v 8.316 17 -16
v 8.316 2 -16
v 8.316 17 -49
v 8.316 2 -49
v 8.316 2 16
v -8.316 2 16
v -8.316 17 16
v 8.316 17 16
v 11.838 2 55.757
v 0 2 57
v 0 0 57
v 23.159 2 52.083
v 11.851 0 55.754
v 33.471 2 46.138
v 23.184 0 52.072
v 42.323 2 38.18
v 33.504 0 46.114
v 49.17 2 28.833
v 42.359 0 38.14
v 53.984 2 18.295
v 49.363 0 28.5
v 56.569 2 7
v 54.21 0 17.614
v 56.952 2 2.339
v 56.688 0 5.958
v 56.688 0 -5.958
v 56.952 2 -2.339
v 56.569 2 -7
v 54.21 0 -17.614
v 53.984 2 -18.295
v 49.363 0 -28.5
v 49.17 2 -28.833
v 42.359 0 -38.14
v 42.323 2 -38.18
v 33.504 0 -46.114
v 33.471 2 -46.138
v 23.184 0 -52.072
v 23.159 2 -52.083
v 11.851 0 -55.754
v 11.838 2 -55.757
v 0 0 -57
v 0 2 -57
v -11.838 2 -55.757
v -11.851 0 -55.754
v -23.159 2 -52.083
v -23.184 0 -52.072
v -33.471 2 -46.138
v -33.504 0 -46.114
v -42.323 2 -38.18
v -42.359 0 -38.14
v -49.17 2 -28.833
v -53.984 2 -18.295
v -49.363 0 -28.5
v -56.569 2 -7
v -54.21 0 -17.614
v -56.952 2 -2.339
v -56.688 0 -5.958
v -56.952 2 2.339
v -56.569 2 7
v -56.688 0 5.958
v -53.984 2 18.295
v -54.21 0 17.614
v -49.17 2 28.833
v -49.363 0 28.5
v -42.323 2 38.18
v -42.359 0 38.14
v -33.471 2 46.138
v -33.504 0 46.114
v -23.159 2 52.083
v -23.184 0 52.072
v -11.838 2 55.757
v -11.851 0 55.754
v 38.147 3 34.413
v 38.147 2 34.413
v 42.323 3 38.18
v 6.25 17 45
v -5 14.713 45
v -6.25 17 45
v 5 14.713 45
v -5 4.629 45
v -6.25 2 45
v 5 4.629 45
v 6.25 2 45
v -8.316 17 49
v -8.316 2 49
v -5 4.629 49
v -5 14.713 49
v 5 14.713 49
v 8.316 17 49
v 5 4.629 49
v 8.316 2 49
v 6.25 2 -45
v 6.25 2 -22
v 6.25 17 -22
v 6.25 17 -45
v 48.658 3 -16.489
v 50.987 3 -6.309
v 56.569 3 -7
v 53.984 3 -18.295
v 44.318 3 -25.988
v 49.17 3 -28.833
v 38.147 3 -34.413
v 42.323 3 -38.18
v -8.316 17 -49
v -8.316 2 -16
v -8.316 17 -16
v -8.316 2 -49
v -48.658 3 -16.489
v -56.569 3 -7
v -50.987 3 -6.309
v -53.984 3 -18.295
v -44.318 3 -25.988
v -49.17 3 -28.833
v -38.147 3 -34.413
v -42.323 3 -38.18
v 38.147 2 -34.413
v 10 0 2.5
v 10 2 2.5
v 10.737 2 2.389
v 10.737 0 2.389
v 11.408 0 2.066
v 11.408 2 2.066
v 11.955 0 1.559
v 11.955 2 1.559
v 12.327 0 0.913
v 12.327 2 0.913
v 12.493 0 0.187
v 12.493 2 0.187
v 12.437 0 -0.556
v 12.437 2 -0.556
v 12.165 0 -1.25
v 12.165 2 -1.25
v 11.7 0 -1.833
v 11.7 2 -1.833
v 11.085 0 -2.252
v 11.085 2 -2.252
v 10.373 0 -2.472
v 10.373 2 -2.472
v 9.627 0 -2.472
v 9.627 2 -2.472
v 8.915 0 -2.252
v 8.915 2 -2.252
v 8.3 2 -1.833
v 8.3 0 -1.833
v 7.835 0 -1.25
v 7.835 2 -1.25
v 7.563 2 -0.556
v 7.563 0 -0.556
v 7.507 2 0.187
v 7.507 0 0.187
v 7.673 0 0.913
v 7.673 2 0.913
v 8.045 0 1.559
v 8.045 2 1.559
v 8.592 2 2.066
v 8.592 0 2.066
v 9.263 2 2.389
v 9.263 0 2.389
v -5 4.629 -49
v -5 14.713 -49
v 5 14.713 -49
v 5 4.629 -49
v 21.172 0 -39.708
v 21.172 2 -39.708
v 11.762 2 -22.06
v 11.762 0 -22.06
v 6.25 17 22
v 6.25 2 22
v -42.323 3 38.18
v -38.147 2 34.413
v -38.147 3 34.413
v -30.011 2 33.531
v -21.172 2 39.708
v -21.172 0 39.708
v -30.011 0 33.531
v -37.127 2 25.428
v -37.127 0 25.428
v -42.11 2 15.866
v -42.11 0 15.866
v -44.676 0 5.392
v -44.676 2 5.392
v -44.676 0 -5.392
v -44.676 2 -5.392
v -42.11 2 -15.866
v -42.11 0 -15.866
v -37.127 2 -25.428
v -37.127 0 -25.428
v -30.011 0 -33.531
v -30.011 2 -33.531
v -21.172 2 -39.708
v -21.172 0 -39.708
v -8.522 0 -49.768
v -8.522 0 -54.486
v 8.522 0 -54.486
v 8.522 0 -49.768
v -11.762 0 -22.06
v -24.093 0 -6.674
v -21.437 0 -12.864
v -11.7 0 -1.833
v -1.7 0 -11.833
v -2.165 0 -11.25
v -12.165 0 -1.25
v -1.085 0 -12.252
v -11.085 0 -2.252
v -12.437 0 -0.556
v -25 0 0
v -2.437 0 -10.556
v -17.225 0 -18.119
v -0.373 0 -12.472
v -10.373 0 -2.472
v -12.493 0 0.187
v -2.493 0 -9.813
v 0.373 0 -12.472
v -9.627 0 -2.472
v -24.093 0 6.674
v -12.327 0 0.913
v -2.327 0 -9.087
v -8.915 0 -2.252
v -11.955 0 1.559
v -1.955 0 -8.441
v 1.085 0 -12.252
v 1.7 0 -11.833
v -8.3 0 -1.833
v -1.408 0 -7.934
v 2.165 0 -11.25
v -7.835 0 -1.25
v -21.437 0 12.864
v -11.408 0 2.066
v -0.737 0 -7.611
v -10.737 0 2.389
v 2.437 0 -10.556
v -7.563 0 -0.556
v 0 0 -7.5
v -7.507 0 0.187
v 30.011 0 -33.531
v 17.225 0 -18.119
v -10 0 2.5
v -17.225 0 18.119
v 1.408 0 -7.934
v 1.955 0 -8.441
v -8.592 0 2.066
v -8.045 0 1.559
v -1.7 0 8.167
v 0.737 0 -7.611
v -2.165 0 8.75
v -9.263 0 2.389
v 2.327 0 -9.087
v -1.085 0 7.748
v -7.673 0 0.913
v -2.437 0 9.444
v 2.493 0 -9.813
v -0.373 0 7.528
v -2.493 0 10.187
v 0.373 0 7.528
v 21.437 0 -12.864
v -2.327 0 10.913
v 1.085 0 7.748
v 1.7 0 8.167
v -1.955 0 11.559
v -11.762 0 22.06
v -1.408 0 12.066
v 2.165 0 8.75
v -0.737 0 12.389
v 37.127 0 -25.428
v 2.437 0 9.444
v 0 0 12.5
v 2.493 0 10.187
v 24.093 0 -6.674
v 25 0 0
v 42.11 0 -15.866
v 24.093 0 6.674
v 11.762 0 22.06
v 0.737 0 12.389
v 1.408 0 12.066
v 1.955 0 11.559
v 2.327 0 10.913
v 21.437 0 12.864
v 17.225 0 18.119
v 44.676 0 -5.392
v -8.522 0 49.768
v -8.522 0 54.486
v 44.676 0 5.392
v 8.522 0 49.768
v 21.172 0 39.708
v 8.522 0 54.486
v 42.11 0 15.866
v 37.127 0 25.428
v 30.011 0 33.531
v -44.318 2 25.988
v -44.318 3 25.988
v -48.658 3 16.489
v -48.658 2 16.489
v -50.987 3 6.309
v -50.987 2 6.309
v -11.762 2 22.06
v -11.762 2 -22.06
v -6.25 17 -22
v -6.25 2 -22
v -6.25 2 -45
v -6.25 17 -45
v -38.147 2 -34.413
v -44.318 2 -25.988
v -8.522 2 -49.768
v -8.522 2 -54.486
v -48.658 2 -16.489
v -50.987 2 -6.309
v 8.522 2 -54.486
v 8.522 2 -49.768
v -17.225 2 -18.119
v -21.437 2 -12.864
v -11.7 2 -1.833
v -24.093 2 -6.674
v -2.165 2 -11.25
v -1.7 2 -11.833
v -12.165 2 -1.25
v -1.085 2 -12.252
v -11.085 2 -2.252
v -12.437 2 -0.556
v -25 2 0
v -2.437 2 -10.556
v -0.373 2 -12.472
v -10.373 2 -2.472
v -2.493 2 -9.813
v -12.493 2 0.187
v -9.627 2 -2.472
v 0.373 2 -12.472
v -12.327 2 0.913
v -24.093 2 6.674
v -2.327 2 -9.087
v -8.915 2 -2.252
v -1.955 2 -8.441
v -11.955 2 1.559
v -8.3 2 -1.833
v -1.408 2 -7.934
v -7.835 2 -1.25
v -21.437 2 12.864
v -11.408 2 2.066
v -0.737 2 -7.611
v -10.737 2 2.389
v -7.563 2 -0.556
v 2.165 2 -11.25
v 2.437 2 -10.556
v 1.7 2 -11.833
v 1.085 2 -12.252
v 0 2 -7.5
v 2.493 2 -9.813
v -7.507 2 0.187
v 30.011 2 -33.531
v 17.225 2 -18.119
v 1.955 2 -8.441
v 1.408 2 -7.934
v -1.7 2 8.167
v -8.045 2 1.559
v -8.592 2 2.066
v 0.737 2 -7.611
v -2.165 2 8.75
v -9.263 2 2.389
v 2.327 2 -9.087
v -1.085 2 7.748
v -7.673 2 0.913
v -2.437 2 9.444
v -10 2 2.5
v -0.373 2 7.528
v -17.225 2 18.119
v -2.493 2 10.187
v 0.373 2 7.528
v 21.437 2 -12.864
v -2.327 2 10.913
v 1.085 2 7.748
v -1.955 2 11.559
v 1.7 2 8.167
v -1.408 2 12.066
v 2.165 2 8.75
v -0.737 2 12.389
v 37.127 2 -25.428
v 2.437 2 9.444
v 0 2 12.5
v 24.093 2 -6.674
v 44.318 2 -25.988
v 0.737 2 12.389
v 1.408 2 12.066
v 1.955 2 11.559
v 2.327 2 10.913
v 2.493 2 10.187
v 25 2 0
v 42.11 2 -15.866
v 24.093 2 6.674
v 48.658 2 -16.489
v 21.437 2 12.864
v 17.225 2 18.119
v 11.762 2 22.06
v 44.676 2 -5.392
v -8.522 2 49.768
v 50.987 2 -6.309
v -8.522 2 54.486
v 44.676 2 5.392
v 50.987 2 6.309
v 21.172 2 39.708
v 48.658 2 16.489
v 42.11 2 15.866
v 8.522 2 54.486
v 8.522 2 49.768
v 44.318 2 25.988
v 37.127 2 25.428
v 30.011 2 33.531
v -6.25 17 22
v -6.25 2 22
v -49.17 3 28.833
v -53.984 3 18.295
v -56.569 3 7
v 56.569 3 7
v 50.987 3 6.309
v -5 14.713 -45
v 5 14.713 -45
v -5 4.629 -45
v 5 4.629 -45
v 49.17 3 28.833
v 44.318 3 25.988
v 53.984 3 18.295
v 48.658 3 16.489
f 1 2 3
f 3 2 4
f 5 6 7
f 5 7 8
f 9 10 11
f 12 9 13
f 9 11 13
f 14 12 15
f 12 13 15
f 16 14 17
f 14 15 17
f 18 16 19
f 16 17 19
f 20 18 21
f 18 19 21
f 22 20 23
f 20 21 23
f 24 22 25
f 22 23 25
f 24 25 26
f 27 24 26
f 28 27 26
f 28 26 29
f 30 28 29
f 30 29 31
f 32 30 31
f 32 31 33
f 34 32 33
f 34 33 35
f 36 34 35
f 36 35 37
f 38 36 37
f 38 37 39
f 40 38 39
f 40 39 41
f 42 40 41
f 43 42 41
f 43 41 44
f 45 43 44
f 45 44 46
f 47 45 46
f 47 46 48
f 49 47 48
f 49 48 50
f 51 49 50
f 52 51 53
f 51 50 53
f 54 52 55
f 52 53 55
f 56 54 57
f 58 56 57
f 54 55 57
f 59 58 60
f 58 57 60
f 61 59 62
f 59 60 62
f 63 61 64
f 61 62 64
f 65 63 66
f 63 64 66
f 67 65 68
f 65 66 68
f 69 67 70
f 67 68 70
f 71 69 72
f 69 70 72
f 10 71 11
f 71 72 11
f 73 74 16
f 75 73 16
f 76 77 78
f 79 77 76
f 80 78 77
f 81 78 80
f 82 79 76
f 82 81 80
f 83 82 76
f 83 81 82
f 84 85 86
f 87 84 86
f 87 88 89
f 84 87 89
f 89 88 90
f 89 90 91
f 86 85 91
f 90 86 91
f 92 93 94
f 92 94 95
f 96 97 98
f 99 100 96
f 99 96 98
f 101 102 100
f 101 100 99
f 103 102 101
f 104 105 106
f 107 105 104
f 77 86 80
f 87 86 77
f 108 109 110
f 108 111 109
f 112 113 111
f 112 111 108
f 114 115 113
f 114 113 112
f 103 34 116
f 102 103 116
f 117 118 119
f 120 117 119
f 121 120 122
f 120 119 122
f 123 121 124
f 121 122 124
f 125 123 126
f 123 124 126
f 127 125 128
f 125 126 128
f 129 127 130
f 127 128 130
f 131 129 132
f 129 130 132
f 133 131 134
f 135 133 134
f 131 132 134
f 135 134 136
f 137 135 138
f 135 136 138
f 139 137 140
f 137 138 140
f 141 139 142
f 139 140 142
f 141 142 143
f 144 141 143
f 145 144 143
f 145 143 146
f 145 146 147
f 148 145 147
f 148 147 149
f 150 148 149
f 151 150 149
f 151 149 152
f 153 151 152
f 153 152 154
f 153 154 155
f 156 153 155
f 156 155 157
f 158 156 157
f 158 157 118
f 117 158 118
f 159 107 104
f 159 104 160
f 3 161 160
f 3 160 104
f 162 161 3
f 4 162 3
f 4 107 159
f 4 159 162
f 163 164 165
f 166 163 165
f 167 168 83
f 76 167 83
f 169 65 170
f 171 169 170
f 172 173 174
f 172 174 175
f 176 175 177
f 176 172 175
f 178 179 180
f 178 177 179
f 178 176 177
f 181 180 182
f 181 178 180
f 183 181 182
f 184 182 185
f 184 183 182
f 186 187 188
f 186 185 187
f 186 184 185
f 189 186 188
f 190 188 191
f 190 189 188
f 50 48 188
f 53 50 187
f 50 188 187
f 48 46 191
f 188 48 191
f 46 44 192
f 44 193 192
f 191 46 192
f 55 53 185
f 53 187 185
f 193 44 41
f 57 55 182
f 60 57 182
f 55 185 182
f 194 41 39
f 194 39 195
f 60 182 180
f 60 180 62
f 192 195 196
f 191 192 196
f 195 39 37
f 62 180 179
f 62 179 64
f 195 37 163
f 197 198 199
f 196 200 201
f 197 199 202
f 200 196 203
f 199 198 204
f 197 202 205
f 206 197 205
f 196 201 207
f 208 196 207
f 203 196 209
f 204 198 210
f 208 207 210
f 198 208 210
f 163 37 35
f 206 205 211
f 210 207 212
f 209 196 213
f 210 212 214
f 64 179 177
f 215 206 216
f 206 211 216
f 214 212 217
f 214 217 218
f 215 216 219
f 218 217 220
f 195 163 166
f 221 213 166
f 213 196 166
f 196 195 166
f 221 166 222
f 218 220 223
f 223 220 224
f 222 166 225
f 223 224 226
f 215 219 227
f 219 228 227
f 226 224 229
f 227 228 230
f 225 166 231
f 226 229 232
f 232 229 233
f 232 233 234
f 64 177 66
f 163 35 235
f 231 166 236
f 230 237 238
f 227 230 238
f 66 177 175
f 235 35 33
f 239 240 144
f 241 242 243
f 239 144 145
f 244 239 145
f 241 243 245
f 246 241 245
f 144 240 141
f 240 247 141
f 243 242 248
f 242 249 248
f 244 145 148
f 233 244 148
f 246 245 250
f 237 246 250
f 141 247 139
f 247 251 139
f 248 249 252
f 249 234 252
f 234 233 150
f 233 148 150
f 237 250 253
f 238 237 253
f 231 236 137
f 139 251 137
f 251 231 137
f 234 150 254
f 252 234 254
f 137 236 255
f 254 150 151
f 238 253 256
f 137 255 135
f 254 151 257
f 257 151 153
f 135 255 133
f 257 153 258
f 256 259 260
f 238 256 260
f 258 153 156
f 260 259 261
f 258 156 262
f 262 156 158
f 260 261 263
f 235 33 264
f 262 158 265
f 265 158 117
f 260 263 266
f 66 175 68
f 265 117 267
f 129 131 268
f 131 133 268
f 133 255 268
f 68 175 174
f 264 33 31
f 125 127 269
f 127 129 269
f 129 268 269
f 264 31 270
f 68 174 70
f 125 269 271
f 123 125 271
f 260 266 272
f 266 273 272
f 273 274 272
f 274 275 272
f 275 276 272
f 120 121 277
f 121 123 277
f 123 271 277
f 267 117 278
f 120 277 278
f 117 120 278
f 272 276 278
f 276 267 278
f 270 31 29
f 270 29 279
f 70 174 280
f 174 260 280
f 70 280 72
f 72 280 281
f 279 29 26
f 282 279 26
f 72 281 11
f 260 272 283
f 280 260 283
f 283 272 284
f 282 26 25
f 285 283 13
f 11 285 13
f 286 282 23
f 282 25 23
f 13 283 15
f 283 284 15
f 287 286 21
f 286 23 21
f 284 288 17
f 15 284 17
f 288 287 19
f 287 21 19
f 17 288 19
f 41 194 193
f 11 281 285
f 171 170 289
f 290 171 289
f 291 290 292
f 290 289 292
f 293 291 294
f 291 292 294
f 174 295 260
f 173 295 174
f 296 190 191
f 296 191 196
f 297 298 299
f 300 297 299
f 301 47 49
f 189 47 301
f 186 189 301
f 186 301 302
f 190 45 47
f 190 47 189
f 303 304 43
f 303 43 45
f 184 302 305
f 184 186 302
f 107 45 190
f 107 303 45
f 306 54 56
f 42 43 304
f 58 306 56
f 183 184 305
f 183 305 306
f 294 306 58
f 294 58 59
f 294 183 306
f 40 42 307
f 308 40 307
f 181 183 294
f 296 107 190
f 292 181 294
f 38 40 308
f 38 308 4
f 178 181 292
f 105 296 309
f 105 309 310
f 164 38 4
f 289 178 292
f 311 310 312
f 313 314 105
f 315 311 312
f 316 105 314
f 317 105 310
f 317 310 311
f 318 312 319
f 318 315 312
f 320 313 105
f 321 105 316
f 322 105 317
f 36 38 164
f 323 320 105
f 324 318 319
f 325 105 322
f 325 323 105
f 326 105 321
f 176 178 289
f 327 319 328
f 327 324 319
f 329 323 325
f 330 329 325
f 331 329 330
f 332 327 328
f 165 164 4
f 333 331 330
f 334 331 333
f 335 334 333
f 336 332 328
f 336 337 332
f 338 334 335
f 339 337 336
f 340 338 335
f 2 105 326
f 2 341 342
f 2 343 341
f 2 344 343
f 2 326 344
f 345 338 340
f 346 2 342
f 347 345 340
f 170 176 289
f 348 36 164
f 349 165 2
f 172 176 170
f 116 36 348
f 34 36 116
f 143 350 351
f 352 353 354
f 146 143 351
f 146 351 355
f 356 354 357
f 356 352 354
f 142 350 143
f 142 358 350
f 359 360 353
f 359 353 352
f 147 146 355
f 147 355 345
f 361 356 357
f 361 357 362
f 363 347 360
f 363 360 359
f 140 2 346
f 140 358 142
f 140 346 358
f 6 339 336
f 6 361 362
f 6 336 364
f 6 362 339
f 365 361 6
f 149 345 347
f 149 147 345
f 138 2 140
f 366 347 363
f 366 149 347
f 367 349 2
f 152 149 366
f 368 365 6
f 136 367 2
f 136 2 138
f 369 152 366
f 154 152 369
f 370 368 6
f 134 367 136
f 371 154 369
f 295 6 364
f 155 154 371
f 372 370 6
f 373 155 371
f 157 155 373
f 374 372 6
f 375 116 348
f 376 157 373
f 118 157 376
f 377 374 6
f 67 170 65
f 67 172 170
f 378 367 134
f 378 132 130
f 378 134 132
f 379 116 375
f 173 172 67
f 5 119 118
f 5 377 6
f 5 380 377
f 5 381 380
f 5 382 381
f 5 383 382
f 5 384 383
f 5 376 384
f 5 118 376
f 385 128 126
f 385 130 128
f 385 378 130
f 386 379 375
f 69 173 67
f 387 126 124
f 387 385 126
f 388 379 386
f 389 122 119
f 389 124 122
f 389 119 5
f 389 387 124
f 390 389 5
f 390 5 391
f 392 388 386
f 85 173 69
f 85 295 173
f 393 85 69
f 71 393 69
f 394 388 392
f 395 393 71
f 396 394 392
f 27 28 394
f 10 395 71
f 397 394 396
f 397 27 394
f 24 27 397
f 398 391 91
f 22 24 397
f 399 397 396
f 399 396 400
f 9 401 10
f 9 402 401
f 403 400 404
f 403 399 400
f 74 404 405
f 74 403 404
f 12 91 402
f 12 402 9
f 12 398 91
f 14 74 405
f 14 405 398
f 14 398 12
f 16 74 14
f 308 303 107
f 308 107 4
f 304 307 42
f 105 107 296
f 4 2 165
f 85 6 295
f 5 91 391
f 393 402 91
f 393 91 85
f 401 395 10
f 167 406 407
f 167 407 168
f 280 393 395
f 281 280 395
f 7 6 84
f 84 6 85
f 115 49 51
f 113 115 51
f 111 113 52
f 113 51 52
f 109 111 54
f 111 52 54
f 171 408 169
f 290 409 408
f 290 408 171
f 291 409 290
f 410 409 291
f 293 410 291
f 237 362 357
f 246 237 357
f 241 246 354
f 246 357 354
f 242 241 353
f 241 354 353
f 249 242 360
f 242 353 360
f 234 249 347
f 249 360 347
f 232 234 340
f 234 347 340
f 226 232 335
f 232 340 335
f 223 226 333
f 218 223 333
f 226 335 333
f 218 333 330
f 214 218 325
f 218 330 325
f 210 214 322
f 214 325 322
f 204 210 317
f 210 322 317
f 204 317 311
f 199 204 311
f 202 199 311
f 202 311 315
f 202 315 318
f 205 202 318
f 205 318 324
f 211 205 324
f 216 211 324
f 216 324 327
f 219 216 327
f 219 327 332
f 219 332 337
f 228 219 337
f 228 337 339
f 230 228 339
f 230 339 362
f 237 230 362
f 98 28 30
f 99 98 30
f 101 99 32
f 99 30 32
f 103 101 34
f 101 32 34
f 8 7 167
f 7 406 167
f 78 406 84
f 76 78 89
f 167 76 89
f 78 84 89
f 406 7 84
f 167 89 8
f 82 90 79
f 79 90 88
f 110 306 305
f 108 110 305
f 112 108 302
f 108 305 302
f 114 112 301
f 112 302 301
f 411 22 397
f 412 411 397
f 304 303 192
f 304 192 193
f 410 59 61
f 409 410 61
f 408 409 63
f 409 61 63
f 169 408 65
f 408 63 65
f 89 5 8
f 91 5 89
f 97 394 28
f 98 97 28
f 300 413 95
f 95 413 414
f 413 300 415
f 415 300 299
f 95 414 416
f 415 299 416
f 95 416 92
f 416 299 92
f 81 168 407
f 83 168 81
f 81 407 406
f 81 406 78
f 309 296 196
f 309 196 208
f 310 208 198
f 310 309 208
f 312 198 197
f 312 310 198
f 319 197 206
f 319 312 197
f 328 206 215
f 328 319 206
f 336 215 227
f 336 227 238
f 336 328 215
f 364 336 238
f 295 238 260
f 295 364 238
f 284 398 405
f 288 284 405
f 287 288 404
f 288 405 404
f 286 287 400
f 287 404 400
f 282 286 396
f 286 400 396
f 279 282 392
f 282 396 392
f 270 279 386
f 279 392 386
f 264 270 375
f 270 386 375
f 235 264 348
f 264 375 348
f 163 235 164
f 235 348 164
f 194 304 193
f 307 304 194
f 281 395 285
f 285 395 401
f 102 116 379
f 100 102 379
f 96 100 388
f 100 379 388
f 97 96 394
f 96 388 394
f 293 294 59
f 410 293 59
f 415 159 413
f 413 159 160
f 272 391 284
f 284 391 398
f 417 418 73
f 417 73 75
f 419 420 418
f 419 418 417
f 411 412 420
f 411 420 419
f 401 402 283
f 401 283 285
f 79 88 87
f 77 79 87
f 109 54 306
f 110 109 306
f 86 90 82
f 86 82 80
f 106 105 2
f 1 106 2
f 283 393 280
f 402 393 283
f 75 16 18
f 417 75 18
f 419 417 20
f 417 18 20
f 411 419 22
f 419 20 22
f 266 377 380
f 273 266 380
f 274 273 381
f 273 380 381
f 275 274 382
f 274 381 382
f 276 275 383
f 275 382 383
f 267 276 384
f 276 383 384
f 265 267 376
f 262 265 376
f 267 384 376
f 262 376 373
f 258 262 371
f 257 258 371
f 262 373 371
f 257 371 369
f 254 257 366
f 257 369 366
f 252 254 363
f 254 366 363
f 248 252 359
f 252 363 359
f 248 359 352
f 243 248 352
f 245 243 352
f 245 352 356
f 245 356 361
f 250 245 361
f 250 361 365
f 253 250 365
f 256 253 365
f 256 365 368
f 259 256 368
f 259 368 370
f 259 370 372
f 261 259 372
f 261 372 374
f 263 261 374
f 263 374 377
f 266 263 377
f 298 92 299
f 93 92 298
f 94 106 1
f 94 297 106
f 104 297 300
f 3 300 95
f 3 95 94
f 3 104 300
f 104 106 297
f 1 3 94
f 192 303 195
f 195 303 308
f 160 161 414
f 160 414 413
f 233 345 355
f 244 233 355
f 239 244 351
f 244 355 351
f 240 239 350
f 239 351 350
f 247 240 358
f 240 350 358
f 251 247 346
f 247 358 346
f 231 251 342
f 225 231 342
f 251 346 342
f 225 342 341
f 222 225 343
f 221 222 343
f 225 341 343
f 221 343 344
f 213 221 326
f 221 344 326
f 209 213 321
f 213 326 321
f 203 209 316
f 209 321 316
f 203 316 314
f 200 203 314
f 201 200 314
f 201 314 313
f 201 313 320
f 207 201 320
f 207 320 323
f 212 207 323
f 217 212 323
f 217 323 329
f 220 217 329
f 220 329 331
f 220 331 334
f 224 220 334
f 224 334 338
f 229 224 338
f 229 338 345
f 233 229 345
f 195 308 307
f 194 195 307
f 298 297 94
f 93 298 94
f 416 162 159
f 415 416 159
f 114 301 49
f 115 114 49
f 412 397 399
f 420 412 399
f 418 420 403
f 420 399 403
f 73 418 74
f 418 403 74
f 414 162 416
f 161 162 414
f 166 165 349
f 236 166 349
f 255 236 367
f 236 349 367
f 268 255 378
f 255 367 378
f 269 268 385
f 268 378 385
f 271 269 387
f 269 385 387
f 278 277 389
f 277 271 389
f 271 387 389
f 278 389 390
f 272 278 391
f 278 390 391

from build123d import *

# Parameters (mm, degrees)
SKETCH1_R           = 57
BOSS_EXTRUDE1_DEPTH = 2
BOSS_EXTRUDE2_DEPTH = 1
SKETCH3_W           = 16.631913854
SKETCH3_H           = 33
SKETCH3_W_2         = 12.5
SKETCH3_H_2         = 23
BOSS_EXTRUDE3_DEPTH = 15
SKETCH4_W           = 10
SKETCH4_H           = 10.084358196
CUT_EXTRUDE1_DEPTH  = 20
SKETCH5_W           = 17.04328316
SKETCH5_H           = 4.71779089
CUT_EXTRUDE2_DEPTH  = 20
SKETCH6_R           = 2.5
CUT_EXTRUDE3_DEPTH  = 20


with BuildPart() as part:
    # Sketch1 → Boss-Extrude1 (new body)
    with BuildSketch(Plane(origin=(0, 0, 0), x_dir=(1, 0, 0), z_dir=(0, 1, 0))):
        with Locations(Location((0, 0, 0), (0, 0, 270))):
            Circle(SKETCH1_R)
    extrude(amount=BOSS_EXTRUDE1_DEPTH)

    # Sketch2 → Boss-Extrude2 (add)
    with BuildSketch(Plane(origin=(0, 2, 0), x_dir=(1, 0, 0), z_dir=(0, 1, 0))):
        with BuildLine():
            Line((-56.568542495, 7), (-50.986982029, 6.30931713))
            ThreePointArc((-50.986982029, 6.30931713), (-46.729900776, 21.34938389), (-38.147214926, 34.413221478))
            Line((-38.147214926, 34.413221478), (-42.323202173, 38.180447324))
            ThreePointArc((-42.323202173, 38.180447324), (-51.84543726, 23.686507453), (-56.568542495, 7))
        make_face()
        with BuildLine():
            Line((42.323202173, 38.180447324), (38.147214926, 34.413221478))
            ThreePointArc((38.147214926, 34.413221478), (46.729900776, 21.34938389), (50.986982029, 6.30931713))
            Line((50.986982029, 6.30931713), (56.568542495, 7))
            ThreePointArc((56.568542495, 7), (51.84543726, 23.686507453), (42.323202173, 38.180447324))
        make_face()
        with BuildLine():
            Line((56.568542495, -7), (50.986982029, -6.30931713))
            ThreePointArc((50.986982029, -6.30931713), (46.729900776, -21.34938389), (38.147214926, -34.413221478))
            Line((38.147214926, -34.413221478), (42.323202173, -38.180447324))
            ThreePointArc((42.323202173, -38.180447324), (51.84543726, -23.686507453), (56.568542495, -7))
        make_face()
        with BuildLine():
            Line((-42.323202173, -38.180447324), (-38.147214926, -34.413221478))
            ThreePointArc((-38.147214926, -34.413221478), (-46.729900776, -21.34938389), (-50.986982029, -6.30931713))
            Line((-50.986982029, -6.30931713), (-56.568542495, -7))
            ThreePointArc((-56.568542495, -7), (-51.84543726, -23.686507453), (-42.323202173, -38.180447324))
        make_face()
    extrude(amount=BOSS_EXTRUDE2_DEPTH)

    # Sketch3 → Boss-Extrude3 (add)
    with BuildSketch(Plane(origin=(0, 2, 0), x_dir=(1, 0, 0), z_dir=(0, 1, 0))):
        with Locations((0, 32.5)):
            Rectangle(SKETCH3_W, SKETCH3_H)
        with Locations((0, 33.5)):
            Rectangle(SKETCH3_W_2, SKETCH3_H_2, mode=Mode.SUBTRACT)
    boss_extrude3 = extrude(amount=BOSS_EXTRUDE3_DEPTH)

    # Sketch4 → Cut-Extrude1 (cut)
    with BuildSketch(Plane(origin=(0, 0, -49), x_dir=(-1, 0, 0), z_dir=(0, 0, -1))):
        with Locations((0, 9.671309809)):
            Rectangle(SKETCH4_W, SKETCH4_H)
    cut_extrude1 = extrude(amount=-CUT_EXTRUDE1_DEPTH, mode=Mode.SUBTRACT)

    # Sketch5 → Cut-Extrude2 (cut)
    with BuildSketch(Plane(origin=(0, 2, 0), x_dir=(1, 0, 0), z_dir=(0, 1, 0))):
        with Locations((0, 52.127337333)):
            Rectangle(SKETCH5_W, SKETCH5_H)
    cut_extrude2 = extrude(amount=-CUT_EXTRUDE2_DEPTH, mode=Mode.SUBTRACT)

    # Mirror1: Boss-Extrude3, Cut-Extrude1, Cut-Extrude2 across plane
    add(boss_extrude3.mirror(Plane.XY))
    add(cut_extrude1.mirror(Plane.XY), mode=Mode.SUBTRACT)
    add(cut_extrude2.mirror(Plane.XY), mode=Mode.SUBTRACT)

    # Sketch6 → Cut-Extrude3 (cut)
    with BuildSketch(Plane(origin=(0, 2, 0), x_dir=(1, 0, 0), z_dir=(0, 1, 0))):
        with Locations(Location((-10, 0, 0), (0, 0, 270))):
            Circle(SKETCH6_R)
        with Locations(Location((0, 10, 0), (0, 0, 270))):
            Circle(SKETCH6_R)
        with Locations(Location((10, 0, 0), (0, 0, 270))):
            Circle(SKETCH6_R)
        with Locations(Location((0, -10, 0), (0, 0, 270))):
            Circle(SKETCH6_R)
        with BuildLine():
            Line((-21.172323644, 39.708093778), (-11.762402025, 22.060052099))
            ThreePointArc((-11.762402025, 22.060052099), (-25, 0), (-11.762402025, -22.060052099))
            Line((-11.762402025, -22.060052099), (-21.172323644, -39.708093778))
            ThreePointArc((-21.172323644, -39.708093778), (-45, 0), (-21.172323644, 39.708093778))
        make_face()
        with BuildLine():
            Line((21.172323644, 39.708093778), (11.762402025, 22.060052099))
            ThreePointArc((11.762402025, 22.060052099), (25, 0), (11.762402025, -22.060052099))
            Line((11.762402025, -22.060052099), (21.172323644, -39.708093778))
            ThreePointArc((21.172323644, -39.708093778), (45, 0), (21.172323644, 39.708093778))
        make_face()
    extrude(amount=-CUT_EXTRUDE3_DEPTH, mode=Mode.SUBTRACT)


solid = part.part
